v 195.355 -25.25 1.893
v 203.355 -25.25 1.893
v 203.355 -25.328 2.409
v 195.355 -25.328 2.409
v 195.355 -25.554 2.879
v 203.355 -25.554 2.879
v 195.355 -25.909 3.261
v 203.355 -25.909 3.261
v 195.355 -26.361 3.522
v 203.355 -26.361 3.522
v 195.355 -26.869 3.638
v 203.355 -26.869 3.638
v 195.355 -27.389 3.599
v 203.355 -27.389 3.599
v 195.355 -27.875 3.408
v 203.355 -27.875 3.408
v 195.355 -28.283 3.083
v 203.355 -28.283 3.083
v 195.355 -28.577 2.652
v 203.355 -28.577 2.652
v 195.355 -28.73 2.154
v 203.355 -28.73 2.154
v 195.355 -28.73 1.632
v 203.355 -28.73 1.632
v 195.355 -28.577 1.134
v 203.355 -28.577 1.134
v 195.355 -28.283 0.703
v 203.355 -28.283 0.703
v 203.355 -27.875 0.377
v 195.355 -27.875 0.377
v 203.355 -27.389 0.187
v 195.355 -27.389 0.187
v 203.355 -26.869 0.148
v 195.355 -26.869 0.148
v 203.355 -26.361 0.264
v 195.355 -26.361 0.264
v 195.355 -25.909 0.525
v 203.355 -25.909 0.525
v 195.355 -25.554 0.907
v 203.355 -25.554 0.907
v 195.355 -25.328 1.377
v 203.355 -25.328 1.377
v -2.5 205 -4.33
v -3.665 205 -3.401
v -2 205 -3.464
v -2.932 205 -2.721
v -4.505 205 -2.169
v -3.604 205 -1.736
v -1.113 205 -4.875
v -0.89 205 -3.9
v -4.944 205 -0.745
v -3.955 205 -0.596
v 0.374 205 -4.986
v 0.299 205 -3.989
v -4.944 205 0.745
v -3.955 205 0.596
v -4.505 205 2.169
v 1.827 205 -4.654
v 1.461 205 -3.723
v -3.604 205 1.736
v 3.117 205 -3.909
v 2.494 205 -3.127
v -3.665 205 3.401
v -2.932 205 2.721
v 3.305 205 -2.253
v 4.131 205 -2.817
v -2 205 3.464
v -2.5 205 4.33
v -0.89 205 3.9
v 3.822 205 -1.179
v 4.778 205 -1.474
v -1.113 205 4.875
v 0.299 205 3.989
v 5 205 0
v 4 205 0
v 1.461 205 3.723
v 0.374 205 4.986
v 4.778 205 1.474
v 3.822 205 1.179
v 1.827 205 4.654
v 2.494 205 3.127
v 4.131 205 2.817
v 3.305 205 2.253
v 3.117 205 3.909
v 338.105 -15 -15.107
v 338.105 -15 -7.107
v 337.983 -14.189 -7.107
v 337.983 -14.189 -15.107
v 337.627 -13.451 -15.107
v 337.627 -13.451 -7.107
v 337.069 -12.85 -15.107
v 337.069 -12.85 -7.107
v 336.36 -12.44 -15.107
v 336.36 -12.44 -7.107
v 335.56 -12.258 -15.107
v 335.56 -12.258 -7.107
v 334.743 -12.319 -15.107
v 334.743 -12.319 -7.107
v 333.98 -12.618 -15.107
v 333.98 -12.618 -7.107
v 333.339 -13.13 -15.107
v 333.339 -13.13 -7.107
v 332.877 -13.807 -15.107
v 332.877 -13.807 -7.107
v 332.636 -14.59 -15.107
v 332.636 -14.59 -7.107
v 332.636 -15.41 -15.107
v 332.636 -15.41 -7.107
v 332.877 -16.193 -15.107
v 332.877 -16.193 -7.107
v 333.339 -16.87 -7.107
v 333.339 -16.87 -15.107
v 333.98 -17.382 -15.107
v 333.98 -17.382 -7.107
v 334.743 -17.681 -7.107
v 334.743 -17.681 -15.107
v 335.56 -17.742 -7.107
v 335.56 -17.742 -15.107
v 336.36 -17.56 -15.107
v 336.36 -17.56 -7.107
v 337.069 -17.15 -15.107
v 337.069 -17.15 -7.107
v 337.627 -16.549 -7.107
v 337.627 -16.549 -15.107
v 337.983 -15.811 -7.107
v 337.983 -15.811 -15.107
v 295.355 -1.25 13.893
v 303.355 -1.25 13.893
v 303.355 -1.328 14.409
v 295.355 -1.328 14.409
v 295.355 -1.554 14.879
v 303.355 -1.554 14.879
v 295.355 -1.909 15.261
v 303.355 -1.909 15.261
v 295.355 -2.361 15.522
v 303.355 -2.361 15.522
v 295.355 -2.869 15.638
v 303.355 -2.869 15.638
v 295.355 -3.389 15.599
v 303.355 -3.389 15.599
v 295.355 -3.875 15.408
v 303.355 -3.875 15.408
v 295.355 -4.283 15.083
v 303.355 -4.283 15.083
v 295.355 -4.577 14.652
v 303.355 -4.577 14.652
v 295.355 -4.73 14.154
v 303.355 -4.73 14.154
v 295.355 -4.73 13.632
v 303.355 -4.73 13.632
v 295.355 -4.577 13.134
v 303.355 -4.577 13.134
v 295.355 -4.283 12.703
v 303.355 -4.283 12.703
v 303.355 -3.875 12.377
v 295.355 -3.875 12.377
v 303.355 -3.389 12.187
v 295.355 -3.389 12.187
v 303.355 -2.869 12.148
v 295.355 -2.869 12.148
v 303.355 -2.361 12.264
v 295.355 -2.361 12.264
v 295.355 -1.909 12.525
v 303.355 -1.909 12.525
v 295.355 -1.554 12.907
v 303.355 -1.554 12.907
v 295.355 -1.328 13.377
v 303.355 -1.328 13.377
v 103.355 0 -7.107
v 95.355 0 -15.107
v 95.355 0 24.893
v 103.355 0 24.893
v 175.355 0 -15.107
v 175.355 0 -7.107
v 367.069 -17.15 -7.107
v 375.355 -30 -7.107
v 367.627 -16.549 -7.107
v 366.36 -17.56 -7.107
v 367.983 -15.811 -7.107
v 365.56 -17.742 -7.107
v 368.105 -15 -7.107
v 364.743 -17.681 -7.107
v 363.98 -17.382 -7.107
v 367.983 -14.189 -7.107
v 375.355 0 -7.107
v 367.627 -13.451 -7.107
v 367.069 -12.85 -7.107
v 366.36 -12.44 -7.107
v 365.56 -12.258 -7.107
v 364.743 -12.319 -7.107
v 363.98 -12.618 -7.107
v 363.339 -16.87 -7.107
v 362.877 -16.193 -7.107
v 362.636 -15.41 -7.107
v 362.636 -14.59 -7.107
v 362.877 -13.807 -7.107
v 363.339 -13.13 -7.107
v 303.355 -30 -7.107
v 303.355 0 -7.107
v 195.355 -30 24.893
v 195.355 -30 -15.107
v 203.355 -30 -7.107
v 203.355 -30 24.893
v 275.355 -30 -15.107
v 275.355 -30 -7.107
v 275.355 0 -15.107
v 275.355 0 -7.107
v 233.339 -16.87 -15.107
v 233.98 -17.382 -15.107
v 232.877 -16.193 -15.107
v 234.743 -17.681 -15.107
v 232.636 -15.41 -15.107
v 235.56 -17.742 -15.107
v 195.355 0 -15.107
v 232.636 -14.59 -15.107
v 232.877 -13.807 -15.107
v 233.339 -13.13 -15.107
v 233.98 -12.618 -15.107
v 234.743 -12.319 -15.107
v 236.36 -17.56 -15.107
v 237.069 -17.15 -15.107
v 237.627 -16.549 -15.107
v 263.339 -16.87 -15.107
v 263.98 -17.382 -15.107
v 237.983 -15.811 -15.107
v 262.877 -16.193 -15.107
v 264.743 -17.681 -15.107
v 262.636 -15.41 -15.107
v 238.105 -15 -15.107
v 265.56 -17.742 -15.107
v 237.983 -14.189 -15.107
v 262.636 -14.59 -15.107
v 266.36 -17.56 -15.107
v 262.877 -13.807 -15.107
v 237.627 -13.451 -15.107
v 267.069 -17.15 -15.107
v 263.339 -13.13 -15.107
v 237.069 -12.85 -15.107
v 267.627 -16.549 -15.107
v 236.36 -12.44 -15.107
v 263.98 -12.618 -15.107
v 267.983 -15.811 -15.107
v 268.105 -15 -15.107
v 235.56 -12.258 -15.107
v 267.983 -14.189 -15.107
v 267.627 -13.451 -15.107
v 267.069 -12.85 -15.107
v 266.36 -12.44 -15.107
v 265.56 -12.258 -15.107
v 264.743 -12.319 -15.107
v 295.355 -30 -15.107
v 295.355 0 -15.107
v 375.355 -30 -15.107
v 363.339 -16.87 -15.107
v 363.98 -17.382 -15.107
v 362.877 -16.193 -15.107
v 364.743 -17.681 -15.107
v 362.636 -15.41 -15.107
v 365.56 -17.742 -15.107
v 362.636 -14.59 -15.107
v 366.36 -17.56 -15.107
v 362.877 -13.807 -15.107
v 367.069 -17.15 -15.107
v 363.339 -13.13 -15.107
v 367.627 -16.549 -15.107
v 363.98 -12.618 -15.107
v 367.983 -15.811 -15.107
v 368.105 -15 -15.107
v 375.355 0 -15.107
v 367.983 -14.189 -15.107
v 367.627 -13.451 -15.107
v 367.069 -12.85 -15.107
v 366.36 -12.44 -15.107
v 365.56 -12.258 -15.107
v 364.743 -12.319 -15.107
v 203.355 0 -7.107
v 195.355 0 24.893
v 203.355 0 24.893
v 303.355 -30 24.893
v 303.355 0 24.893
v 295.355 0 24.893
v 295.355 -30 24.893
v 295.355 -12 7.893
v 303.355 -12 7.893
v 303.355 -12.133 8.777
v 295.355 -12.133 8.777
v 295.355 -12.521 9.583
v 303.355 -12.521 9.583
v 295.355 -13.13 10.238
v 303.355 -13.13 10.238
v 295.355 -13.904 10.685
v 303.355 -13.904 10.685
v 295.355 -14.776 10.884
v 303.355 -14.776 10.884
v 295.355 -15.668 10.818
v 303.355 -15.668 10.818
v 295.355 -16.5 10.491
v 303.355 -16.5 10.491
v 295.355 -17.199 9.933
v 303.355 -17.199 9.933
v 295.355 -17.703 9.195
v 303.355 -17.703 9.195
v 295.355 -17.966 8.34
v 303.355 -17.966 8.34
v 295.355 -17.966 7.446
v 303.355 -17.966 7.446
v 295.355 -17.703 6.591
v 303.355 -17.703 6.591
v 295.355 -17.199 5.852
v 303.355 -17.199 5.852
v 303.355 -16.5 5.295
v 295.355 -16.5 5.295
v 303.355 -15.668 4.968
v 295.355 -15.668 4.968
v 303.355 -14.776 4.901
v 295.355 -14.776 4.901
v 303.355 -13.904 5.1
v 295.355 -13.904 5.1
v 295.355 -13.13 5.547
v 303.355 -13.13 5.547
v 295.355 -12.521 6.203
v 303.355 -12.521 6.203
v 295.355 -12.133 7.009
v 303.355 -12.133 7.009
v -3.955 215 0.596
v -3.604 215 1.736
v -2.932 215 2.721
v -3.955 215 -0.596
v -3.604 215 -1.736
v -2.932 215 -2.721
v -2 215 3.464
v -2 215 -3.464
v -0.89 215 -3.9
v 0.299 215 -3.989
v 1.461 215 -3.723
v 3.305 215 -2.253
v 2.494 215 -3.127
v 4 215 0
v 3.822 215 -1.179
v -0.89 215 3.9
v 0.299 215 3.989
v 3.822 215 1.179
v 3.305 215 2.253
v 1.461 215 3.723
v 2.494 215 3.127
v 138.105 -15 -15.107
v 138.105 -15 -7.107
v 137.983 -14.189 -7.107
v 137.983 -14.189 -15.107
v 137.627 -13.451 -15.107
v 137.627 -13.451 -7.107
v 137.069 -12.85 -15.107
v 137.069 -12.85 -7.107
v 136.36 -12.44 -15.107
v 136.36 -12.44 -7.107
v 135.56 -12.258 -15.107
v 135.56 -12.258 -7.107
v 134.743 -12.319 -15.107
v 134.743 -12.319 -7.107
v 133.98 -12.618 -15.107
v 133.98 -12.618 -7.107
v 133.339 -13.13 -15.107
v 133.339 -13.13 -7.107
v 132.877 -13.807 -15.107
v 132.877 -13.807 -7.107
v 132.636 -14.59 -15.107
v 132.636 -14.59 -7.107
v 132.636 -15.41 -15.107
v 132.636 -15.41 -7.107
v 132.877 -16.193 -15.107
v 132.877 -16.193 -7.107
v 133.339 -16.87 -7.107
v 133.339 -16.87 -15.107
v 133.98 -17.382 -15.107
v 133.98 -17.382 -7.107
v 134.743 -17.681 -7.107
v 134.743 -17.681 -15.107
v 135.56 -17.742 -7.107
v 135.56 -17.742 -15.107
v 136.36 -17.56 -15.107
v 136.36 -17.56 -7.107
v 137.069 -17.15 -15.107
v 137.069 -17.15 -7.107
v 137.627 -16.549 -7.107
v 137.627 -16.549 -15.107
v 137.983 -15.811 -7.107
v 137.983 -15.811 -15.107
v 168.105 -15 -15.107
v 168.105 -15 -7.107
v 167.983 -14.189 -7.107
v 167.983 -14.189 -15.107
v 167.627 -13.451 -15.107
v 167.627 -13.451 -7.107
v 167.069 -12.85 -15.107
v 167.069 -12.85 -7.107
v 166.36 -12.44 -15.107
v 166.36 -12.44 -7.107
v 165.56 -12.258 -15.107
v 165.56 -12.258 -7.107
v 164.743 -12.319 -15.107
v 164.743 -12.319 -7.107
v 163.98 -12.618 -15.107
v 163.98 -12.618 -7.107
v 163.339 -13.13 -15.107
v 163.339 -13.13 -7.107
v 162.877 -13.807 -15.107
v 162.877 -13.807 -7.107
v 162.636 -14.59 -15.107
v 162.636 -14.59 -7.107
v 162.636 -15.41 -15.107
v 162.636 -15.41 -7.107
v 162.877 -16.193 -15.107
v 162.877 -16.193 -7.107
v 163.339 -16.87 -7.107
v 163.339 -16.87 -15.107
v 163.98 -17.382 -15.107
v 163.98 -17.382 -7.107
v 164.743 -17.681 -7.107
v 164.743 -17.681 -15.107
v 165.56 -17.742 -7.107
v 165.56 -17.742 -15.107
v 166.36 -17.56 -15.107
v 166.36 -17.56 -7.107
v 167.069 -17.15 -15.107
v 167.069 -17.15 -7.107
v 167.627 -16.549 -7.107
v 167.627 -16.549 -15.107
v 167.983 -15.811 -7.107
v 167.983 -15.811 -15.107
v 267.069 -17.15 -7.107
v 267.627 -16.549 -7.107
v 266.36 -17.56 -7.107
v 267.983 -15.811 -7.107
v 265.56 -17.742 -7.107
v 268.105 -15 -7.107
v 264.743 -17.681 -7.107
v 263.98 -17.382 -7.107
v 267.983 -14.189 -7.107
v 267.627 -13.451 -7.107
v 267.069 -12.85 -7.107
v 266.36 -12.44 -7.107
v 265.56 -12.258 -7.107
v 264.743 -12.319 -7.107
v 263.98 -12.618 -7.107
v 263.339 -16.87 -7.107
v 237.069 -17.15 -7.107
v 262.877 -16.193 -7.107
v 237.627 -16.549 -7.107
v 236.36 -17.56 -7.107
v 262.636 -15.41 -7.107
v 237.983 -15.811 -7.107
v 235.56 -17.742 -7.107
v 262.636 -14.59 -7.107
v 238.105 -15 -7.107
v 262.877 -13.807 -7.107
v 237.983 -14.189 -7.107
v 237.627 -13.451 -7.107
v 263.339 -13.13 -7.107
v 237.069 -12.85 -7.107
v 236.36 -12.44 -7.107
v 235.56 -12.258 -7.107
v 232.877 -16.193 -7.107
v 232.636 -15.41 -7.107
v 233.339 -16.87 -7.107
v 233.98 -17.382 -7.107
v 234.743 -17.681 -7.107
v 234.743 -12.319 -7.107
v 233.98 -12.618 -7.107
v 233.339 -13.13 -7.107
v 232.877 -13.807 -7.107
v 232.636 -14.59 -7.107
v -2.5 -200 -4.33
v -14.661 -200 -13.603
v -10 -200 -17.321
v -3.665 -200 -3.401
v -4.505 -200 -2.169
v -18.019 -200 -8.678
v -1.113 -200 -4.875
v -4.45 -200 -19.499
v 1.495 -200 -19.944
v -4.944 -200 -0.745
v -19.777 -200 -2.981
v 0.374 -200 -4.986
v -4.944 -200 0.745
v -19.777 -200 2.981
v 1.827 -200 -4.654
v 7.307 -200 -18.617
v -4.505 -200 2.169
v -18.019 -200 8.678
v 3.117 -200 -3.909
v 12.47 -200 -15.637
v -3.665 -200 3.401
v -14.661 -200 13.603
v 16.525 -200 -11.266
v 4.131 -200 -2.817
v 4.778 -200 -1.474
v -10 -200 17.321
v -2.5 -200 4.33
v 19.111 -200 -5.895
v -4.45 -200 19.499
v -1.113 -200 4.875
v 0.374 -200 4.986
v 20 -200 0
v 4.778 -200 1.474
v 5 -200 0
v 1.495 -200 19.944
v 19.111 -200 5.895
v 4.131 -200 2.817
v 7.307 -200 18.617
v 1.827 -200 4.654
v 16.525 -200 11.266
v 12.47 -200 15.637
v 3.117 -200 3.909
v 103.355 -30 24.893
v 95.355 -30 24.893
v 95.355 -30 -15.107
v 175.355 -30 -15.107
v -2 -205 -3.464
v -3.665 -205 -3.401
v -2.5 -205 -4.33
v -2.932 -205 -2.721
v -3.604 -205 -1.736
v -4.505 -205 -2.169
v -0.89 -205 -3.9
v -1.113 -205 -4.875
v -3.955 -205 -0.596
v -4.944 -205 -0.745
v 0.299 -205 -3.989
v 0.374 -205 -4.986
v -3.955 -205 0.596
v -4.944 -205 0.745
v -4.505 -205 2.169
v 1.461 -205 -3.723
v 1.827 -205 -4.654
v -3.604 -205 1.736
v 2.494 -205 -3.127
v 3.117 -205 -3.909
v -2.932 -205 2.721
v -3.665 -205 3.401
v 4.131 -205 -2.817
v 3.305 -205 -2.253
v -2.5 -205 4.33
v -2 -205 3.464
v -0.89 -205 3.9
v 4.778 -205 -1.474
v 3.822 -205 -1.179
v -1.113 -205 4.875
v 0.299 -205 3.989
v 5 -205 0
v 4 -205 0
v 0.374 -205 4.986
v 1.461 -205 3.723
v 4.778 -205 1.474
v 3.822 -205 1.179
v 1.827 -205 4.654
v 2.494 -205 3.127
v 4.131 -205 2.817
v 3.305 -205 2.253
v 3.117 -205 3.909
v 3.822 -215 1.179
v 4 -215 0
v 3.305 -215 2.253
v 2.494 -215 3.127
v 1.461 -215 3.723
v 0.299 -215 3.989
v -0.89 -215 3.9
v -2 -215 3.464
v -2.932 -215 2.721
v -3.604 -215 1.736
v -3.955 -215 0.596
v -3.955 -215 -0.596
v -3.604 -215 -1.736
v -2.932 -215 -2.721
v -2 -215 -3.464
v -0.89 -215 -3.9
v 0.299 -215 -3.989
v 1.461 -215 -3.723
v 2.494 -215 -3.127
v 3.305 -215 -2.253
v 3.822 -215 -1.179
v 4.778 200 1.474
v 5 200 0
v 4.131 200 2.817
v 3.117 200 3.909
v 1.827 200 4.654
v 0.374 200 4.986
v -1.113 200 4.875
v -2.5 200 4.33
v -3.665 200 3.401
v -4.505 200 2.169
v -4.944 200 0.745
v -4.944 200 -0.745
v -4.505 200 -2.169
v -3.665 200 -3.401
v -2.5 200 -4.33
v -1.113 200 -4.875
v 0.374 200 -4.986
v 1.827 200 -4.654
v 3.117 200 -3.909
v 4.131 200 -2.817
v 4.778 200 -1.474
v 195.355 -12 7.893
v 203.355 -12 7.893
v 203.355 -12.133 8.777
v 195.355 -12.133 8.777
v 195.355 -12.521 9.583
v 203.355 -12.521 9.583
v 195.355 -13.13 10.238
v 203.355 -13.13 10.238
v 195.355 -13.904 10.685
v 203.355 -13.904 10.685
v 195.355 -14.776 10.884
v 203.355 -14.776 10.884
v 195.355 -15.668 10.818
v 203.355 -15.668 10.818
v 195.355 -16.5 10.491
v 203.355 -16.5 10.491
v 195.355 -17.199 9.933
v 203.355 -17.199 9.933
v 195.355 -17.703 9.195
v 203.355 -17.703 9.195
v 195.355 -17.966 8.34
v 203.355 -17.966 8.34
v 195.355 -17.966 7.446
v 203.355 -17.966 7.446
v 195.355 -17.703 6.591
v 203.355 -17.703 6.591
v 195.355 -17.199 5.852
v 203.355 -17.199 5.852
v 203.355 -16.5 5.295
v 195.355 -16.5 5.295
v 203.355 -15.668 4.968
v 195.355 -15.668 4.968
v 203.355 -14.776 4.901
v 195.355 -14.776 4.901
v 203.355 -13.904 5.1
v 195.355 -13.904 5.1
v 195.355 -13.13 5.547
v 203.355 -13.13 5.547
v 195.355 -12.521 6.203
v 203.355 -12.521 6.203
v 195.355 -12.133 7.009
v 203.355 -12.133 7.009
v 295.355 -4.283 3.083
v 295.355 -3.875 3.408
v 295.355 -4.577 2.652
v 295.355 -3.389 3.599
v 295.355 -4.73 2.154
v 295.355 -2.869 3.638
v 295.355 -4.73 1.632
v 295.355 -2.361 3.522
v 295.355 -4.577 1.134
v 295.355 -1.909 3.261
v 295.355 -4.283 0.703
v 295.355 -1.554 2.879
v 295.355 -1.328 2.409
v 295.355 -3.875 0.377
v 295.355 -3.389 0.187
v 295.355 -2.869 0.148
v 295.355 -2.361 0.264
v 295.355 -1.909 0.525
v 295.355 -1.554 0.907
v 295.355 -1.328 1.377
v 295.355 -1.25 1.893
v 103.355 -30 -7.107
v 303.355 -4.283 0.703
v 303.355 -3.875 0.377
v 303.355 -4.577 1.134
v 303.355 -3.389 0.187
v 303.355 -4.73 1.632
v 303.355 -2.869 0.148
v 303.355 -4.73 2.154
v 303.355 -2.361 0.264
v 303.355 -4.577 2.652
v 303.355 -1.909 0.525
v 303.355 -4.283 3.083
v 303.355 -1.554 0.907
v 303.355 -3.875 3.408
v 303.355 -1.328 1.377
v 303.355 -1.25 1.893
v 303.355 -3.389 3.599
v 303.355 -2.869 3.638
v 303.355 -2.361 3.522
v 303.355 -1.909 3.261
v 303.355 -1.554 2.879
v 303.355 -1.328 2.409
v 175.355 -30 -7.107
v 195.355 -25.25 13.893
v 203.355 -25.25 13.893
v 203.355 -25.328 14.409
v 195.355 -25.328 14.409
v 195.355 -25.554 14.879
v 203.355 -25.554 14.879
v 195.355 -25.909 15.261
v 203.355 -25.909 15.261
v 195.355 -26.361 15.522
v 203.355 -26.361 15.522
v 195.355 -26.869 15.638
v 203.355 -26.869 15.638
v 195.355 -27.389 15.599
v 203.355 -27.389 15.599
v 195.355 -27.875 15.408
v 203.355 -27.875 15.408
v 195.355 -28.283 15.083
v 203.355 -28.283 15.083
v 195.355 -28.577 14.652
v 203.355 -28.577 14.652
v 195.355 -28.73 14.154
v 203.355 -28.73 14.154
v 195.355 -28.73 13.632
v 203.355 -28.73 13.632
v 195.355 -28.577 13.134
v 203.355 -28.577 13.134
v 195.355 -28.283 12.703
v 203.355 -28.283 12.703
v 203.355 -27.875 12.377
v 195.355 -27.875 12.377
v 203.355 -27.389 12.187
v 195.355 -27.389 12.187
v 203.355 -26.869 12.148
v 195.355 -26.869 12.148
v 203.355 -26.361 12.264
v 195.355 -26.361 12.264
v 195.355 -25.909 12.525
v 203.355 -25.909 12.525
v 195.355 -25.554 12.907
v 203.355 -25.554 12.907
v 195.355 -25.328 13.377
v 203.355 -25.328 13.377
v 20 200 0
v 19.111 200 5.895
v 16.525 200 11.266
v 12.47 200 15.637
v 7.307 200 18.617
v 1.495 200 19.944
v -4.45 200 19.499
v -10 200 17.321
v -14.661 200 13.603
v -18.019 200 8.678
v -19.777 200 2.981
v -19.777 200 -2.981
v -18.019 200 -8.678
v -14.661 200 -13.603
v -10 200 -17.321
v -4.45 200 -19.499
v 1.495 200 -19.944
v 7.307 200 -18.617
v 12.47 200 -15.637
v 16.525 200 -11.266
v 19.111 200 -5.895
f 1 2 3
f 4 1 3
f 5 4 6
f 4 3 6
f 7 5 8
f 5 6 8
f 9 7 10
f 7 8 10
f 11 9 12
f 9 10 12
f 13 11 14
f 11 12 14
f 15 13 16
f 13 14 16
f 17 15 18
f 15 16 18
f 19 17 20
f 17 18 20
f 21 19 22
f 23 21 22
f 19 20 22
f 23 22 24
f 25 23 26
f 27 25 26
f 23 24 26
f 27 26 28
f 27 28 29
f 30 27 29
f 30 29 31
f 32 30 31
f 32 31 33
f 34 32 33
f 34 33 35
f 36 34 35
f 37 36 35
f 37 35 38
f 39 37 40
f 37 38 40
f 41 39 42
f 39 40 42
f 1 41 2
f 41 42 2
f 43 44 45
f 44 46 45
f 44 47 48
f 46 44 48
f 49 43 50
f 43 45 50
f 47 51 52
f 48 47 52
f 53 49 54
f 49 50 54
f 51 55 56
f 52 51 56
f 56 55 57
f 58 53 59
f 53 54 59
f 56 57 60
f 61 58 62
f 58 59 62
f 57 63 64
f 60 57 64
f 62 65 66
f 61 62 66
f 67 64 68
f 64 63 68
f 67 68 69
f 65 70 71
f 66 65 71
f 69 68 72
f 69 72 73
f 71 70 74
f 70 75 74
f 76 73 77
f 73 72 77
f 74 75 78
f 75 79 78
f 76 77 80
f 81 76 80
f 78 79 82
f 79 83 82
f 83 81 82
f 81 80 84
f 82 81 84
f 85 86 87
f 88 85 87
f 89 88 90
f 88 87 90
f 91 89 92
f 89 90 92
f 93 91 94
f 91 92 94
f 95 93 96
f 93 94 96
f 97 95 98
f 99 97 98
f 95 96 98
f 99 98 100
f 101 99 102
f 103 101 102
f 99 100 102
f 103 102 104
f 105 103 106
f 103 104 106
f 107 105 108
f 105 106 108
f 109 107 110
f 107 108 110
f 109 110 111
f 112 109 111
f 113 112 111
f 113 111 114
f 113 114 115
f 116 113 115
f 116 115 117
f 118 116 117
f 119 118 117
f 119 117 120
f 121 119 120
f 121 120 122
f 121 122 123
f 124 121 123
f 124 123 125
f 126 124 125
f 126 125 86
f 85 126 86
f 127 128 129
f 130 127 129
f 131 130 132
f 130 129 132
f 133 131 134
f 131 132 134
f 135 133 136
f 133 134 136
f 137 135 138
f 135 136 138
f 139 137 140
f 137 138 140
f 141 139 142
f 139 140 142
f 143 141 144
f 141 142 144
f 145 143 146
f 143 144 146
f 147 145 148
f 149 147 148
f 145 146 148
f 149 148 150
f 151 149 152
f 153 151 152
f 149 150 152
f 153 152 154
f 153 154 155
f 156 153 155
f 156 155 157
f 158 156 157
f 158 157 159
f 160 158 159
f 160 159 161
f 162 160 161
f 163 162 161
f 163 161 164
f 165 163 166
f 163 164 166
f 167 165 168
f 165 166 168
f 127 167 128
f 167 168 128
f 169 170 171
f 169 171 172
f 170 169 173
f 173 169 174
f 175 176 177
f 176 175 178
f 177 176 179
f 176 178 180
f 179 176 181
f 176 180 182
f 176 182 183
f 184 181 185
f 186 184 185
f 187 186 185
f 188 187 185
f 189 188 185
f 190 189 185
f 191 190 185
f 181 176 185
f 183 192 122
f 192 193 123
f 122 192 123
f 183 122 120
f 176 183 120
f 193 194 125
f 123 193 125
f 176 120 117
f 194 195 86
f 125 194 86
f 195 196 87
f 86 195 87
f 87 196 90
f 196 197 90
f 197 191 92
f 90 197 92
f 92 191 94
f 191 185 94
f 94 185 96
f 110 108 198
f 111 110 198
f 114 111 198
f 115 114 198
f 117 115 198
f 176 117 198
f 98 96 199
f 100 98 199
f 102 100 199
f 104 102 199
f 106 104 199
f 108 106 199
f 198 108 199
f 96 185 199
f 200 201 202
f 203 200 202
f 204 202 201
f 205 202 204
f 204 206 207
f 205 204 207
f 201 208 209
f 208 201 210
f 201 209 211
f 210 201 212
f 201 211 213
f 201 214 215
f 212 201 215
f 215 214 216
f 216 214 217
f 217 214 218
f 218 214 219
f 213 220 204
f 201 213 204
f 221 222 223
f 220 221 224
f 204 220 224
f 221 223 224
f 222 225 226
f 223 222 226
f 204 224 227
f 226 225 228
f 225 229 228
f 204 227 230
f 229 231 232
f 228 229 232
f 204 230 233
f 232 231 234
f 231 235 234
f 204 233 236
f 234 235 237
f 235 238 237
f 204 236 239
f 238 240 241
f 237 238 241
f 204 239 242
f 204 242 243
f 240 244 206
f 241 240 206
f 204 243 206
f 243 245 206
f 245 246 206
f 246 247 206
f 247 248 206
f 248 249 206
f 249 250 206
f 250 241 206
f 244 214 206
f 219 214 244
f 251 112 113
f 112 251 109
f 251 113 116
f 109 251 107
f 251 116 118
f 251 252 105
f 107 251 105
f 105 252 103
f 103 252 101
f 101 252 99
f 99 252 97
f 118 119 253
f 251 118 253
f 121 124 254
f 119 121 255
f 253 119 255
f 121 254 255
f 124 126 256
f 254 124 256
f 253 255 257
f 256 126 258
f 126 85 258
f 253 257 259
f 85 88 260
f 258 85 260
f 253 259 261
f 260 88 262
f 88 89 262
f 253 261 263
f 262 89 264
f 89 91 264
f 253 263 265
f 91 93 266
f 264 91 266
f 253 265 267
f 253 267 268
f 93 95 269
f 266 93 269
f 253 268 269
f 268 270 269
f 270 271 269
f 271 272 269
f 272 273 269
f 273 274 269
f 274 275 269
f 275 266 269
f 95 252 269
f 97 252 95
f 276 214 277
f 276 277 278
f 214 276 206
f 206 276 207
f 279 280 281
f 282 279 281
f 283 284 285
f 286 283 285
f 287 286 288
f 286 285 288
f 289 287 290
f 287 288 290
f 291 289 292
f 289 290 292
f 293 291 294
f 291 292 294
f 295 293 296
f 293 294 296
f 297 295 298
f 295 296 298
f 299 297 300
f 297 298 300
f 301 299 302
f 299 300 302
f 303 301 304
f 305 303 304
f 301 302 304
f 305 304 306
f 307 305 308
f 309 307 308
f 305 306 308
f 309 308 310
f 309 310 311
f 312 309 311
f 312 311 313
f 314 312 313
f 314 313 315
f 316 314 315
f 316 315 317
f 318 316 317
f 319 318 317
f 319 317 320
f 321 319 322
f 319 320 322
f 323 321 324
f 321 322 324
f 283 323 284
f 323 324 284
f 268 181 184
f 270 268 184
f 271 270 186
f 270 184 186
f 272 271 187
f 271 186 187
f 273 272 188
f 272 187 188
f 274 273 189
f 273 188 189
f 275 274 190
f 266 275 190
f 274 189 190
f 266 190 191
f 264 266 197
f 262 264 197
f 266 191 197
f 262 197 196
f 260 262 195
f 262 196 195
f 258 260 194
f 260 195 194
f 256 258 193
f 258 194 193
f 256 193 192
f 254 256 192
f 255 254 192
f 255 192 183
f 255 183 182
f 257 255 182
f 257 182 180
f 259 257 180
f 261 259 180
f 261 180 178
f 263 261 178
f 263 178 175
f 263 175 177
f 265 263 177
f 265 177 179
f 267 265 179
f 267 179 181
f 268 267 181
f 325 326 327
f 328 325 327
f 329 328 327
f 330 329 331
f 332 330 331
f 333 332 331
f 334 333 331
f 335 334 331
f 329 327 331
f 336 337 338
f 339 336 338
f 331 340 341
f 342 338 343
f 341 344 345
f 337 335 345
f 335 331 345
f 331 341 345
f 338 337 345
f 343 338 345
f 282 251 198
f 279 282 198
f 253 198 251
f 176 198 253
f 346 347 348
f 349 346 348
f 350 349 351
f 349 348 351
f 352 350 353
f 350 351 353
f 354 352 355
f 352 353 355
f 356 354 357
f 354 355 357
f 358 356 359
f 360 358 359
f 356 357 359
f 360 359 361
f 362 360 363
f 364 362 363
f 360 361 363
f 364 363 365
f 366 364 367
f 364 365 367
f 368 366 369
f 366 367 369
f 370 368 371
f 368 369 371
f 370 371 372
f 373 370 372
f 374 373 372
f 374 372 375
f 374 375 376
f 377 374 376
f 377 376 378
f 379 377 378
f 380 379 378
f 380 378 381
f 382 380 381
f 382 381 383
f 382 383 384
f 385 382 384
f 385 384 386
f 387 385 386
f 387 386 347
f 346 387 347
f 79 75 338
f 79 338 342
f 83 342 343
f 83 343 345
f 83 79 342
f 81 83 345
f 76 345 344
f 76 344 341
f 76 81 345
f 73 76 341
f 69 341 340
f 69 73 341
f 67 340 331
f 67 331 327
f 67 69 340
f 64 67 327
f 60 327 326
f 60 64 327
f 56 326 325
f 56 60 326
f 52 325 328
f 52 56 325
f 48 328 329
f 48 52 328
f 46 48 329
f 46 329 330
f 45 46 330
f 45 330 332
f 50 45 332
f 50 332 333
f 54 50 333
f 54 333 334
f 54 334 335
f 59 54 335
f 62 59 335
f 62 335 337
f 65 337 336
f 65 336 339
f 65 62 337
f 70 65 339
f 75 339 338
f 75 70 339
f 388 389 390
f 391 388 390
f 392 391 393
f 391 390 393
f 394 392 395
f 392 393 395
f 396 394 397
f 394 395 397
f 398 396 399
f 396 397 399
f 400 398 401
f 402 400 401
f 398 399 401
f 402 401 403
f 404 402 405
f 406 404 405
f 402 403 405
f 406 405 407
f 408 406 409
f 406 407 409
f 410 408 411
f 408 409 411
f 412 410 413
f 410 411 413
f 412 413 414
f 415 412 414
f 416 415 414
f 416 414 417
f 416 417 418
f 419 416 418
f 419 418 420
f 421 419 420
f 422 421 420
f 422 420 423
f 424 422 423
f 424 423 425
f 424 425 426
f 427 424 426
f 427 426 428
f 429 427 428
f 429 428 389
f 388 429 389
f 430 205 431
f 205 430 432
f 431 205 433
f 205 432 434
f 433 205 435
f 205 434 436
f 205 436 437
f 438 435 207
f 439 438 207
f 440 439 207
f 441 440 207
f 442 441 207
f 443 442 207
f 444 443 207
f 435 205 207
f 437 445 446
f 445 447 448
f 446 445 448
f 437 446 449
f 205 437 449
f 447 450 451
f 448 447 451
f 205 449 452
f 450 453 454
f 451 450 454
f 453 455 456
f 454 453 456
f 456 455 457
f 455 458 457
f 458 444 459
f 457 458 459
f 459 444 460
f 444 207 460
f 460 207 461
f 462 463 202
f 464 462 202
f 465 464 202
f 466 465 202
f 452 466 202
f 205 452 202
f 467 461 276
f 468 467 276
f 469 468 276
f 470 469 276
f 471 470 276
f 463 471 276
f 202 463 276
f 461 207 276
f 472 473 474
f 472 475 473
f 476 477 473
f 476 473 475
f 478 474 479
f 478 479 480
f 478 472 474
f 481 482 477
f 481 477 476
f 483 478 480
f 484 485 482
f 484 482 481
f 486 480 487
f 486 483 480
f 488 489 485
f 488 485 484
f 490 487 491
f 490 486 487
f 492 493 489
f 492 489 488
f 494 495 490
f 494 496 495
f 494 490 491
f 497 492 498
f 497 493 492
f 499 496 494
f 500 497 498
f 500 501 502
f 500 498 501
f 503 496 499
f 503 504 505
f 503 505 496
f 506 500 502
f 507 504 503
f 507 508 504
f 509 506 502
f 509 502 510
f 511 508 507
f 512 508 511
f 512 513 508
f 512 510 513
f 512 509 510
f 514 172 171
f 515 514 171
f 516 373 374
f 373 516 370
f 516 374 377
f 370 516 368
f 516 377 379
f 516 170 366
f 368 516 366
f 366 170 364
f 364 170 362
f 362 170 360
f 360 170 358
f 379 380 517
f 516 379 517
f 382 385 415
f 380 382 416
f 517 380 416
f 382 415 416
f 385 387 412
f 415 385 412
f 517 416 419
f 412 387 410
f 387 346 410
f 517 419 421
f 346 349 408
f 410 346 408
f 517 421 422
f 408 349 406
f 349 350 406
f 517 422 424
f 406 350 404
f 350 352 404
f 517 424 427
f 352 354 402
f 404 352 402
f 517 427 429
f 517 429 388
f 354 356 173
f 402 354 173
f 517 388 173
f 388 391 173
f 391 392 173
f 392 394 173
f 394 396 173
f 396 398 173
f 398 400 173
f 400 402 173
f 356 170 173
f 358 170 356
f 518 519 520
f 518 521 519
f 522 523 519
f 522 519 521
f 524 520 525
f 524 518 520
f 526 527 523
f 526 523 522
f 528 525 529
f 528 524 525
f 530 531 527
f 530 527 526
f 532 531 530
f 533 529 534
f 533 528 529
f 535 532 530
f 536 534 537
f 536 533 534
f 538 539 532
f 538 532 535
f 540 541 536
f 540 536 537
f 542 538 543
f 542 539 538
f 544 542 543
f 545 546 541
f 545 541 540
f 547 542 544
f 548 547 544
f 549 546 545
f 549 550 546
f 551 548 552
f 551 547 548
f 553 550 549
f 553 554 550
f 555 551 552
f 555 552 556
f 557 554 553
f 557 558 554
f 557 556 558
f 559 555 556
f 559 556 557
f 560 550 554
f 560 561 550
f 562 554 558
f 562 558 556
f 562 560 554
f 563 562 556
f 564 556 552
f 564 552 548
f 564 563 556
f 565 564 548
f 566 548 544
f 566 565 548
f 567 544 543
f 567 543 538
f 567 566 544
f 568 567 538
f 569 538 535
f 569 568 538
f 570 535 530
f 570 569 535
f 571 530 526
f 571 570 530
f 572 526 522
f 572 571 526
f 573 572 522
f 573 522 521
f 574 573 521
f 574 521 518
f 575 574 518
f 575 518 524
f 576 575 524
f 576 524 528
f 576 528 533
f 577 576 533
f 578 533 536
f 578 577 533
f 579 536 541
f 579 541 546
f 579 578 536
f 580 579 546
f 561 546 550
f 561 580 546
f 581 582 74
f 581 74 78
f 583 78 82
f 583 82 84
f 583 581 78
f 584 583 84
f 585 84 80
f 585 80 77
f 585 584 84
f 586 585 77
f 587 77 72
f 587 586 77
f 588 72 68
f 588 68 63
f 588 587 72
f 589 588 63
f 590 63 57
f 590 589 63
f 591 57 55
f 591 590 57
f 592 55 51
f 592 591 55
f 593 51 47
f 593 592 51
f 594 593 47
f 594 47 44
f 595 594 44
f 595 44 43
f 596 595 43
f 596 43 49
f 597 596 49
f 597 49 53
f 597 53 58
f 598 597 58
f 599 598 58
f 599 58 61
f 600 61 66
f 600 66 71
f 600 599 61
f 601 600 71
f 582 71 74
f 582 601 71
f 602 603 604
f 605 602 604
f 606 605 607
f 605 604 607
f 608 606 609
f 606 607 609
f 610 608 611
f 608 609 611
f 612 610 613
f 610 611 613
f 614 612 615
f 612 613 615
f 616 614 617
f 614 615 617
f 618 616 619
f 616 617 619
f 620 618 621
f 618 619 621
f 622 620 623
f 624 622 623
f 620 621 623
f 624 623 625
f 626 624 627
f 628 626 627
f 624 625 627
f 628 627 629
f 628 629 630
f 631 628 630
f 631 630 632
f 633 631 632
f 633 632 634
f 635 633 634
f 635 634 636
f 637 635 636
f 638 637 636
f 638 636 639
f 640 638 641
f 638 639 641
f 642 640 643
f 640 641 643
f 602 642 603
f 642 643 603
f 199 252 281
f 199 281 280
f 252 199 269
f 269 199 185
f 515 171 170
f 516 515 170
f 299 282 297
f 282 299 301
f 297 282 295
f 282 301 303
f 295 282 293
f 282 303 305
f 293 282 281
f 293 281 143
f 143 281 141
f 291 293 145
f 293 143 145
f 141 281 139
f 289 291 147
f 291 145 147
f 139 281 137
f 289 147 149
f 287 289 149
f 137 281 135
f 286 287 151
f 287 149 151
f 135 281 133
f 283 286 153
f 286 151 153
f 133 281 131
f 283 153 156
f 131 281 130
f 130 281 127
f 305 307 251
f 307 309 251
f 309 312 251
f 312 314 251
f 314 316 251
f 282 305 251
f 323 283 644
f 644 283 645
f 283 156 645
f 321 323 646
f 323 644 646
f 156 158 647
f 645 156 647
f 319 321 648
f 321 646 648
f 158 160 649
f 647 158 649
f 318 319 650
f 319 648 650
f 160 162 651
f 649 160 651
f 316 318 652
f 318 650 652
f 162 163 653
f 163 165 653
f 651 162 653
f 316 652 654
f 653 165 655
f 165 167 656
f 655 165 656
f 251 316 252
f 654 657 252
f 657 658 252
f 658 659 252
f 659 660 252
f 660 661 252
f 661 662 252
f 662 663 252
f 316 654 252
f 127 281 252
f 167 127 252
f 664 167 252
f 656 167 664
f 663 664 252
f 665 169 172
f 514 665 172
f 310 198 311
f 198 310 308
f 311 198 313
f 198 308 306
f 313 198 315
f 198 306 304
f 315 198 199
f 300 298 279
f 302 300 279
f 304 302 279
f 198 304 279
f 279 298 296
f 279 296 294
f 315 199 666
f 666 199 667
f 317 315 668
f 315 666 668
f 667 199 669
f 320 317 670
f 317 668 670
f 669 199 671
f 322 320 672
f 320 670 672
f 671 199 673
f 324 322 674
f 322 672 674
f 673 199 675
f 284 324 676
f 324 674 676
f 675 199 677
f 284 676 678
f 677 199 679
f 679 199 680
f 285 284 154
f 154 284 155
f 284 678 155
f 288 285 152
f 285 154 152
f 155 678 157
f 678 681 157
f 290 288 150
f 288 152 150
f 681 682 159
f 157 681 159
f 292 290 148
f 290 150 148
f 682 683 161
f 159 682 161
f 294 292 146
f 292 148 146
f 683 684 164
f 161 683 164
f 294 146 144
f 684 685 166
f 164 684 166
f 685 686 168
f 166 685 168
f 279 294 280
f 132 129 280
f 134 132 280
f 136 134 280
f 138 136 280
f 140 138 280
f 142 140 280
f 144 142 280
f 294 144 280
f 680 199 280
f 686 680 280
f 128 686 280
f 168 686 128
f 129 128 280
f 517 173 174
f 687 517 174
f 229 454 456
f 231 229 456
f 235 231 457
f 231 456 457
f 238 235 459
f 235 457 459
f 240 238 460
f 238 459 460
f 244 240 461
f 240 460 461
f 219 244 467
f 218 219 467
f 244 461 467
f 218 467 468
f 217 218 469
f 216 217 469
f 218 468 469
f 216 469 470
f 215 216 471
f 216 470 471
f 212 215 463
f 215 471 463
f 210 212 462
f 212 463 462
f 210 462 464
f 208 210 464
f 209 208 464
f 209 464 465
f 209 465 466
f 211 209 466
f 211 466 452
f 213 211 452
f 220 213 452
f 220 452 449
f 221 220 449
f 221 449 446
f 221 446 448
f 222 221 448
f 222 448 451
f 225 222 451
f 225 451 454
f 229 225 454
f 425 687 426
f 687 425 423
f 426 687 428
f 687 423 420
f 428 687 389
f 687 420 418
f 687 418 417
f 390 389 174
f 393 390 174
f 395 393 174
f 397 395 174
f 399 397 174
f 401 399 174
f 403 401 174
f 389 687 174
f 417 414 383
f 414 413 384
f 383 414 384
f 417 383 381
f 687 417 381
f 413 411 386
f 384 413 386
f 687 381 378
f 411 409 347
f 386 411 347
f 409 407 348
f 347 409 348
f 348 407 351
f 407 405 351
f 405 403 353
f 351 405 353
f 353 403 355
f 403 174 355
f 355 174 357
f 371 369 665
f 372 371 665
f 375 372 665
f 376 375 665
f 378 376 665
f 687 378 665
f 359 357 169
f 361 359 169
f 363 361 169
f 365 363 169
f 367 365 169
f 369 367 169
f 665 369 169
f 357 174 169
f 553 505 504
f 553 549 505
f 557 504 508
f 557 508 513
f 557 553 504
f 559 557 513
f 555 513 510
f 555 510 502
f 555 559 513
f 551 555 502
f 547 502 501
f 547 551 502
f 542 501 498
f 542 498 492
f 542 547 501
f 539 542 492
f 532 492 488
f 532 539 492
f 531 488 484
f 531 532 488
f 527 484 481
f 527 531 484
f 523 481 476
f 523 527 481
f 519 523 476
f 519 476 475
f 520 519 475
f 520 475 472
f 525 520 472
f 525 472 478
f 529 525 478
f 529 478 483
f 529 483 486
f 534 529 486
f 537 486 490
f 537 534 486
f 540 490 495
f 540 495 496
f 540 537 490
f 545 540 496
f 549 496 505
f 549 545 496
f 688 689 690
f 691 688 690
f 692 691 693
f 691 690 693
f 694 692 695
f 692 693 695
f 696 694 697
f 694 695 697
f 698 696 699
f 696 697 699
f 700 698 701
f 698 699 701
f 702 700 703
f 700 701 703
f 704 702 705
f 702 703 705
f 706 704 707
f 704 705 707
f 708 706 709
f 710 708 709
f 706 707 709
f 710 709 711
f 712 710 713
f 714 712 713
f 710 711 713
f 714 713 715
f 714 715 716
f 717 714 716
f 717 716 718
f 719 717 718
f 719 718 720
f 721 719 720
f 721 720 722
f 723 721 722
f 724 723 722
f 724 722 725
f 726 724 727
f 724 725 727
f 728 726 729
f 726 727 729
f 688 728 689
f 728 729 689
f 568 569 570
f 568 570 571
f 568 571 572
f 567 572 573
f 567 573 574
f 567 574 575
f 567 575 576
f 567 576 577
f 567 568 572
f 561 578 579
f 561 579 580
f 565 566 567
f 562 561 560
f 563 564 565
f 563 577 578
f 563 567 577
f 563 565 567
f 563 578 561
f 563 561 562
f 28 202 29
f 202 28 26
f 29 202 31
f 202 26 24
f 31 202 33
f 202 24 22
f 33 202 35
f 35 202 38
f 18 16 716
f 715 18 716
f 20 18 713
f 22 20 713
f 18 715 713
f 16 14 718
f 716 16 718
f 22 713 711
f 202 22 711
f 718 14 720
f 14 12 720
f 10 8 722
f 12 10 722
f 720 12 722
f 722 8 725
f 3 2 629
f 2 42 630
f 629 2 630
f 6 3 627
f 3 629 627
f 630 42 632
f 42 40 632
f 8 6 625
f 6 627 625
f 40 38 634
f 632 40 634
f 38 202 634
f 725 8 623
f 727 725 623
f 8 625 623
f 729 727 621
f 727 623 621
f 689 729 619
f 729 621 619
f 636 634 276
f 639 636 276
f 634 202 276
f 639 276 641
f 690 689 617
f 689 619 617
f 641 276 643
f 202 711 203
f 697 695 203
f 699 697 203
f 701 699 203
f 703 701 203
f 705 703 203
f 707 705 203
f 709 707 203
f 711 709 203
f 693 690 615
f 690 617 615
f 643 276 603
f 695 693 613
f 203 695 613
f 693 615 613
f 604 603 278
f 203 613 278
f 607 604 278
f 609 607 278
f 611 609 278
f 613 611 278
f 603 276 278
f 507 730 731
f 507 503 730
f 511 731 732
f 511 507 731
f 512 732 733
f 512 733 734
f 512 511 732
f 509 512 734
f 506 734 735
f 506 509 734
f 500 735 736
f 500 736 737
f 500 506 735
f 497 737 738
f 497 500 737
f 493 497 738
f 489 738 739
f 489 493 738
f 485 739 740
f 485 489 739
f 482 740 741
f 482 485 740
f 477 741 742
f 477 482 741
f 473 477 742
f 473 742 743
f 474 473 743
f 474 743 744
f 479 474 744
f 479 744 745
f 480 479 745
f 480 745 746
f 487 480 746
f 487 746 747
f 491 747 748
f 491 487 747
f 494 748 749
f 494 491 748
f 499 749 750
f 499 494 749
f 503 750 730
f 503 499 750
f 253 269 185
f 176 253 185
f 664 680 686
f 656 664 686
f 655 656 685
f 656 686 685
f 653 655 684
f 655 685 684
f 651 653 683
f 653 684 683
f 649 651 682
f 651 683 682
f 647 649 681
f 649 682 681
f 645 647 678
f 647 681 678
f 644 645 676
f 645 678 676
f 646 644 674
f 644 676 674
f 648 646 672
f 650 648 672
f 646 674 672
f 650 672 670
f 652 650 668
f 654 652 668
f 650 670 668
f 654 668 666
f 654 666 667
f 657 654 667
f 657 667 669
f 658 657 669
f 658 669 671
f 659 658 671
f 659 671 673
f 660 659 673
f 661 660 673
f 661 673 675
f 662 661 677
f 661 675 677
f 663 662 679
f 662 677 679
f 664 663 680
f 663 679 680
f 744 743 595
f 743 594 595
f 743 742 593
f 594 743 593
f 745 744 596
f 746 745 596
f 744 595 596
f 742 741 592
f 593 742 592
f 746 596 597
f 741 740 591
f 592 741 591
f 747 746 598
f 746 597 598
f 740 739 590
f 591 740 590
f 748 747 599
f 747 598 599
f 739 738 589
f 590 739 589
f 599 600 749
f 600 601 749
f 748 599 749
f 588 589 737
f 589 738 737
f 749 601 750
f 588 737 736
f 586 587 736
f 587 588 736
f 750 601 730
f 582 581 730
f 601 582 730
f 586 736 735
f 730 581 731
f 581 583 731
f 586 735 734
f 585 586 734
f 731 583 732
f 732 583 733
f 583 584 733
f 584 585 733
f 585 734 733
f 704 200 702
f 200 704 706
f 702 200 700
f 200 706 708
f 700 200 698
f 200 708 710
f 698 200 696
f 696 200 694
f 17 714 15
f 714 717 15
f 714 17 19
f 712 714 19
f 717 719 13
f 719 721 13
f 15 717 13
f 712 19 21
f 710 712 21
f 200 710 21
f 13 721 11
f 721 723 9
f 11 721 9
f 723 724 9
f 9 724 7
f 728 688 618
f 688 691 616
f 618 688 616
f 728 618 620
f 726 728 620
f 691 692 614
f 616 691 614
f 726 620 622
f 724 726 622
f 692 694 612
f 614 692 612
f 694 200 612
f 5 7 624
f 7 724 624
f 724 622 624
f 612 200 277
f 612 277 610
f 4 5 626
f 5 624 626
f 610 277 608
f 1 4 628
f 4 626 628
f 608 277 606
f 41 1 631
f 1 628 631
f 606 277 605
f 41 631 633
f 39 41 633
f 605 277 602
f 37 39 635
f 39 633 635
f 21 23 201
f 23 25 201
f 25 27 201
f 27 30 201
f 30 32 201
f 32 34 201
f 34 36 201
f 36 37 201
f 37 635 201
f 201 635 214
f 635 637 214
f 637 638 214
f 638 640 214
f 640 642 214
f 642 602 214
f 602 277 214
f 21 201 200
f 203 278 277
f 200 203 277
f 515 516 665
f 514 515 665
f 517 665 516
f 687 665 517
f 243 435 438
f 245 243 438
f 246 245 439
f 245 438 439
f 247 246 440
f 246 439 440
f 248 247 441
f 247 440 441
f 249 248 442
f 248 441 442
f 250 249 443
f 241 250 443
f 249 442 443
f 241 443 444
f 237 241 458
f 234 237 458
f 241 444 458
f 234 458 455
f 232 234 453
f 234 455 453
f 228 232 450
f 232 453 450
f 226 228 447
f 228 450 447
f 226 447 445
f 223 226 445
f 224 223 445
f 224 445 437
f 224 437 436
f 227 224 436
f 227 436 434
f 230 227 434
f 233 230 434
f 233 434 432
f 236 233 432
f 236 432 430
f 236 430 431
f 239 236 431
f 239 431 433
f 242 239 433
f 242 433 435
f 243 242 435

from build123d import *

# Parameters (mm, degrees)
F0_R      = 4
F1_DEPTH  = 215
F2_R      = 5
F3_DEPTH  = 205
F4_R      = 20
F5_DEPTH  = 200
F7_DEPTH  = 30
F8_R      = 2.75
F9_DEPTH  = 12.8938689212
F13_R     = 1.75
F13_R_2   = 3
F14_DEPTH = 8
F15_R     = 1.75
F15_R_2   = 3
F16_DEPTH = 8


with BuildPart() as f1:
    # F0 (on Front) → F1 (new body, symmetric)
    with BuildSketch(Plane.XZ):
        Circle(F0_R)
    extrude(amount=F1_DEPTH, both=True)

    # F2 (on Front) → F3 (join, symmetric)
    with BuildSketch(Plane.XZ):
        Circle(F2_R)
    extrude(amount=F3_DEPTH, both=True)

    # F4 (on Front) → F5 (join, symmetric)
    with BuildSketch(Plane.XZ):
        Circle(F4_R)
    extrude(amount=F5_DEPTH, both=True)


with BuildPart() as f7:
    # F6 (on Front) → F7 (new body)
    with BuildSketch(Plane.XZ):
        Polygon((103.3548788592, 24.8928689212), (95.3548788592, 24.8928689212), (95.3548788592, -15.1071310788), (175.3548788592, -15.1071310788), (175.3548788592, -7.1071310788), (103.3548788592, -7.1071310788), align=None)
    extrude(amount=F7_DEPTH)

    # F8 (on face) → F9 (cut, through all)
    with BuildSketch(Plane.XY.offset(-7.1071310788)):
        with Locations((135.3548788592, -15)):
            Circle(F8_R)
        with Locations((165.3548788592, -15)):
            Circle(F8_R)
    extrude(amount=-F9_DEPTH, mode=Mode.SUBTRACT)


with BuildPart() as f11_1:
    # F11: copy of F7
    add(f7.part.moved(Location((100, 0, 0))))


with BuildPart() as f12_1:
    # F12: copy of F11_1
    add(f11_1.part.moved(Location((100, 0, 0))))

    # F15 (on face) → F16 (cut)
    with BuildSketch(Plane.YZ.offset(303.3548788592)):
        with Locations((-3, 13.8928689212)):
            Circle(F15_R)
        with Locations((-3, 1.8928689212)):
            Circle(F15_R)
        with Locations((-15, 7.8928689212)):
            Circle(F15_R_2)
    extrude(amount=-F16_DEPTH, mode=Mode.SUBTRACT)


with BuildPart() as f11_1_1:
    add(f11_1.part)

    # F13 (on face) → F14 (cut)
    with BuildSketch(Plane.YZ.offset(203.3548788592)):
        with Locations((-27, 13.8928689212)):
            Circle(F13_R)
        with Locations((-27, 1.8928689212)):
            Circle(F13_R)
        with Locations((-15, 7.8928689212)):
            Circle(F13_R_2)
    extrude(amount=-F14_DEPTH, mode=Mode.SUBTRACT)


solid = Compound([f1.part, f7.part, f12_1.part, f11_1_1.part])
